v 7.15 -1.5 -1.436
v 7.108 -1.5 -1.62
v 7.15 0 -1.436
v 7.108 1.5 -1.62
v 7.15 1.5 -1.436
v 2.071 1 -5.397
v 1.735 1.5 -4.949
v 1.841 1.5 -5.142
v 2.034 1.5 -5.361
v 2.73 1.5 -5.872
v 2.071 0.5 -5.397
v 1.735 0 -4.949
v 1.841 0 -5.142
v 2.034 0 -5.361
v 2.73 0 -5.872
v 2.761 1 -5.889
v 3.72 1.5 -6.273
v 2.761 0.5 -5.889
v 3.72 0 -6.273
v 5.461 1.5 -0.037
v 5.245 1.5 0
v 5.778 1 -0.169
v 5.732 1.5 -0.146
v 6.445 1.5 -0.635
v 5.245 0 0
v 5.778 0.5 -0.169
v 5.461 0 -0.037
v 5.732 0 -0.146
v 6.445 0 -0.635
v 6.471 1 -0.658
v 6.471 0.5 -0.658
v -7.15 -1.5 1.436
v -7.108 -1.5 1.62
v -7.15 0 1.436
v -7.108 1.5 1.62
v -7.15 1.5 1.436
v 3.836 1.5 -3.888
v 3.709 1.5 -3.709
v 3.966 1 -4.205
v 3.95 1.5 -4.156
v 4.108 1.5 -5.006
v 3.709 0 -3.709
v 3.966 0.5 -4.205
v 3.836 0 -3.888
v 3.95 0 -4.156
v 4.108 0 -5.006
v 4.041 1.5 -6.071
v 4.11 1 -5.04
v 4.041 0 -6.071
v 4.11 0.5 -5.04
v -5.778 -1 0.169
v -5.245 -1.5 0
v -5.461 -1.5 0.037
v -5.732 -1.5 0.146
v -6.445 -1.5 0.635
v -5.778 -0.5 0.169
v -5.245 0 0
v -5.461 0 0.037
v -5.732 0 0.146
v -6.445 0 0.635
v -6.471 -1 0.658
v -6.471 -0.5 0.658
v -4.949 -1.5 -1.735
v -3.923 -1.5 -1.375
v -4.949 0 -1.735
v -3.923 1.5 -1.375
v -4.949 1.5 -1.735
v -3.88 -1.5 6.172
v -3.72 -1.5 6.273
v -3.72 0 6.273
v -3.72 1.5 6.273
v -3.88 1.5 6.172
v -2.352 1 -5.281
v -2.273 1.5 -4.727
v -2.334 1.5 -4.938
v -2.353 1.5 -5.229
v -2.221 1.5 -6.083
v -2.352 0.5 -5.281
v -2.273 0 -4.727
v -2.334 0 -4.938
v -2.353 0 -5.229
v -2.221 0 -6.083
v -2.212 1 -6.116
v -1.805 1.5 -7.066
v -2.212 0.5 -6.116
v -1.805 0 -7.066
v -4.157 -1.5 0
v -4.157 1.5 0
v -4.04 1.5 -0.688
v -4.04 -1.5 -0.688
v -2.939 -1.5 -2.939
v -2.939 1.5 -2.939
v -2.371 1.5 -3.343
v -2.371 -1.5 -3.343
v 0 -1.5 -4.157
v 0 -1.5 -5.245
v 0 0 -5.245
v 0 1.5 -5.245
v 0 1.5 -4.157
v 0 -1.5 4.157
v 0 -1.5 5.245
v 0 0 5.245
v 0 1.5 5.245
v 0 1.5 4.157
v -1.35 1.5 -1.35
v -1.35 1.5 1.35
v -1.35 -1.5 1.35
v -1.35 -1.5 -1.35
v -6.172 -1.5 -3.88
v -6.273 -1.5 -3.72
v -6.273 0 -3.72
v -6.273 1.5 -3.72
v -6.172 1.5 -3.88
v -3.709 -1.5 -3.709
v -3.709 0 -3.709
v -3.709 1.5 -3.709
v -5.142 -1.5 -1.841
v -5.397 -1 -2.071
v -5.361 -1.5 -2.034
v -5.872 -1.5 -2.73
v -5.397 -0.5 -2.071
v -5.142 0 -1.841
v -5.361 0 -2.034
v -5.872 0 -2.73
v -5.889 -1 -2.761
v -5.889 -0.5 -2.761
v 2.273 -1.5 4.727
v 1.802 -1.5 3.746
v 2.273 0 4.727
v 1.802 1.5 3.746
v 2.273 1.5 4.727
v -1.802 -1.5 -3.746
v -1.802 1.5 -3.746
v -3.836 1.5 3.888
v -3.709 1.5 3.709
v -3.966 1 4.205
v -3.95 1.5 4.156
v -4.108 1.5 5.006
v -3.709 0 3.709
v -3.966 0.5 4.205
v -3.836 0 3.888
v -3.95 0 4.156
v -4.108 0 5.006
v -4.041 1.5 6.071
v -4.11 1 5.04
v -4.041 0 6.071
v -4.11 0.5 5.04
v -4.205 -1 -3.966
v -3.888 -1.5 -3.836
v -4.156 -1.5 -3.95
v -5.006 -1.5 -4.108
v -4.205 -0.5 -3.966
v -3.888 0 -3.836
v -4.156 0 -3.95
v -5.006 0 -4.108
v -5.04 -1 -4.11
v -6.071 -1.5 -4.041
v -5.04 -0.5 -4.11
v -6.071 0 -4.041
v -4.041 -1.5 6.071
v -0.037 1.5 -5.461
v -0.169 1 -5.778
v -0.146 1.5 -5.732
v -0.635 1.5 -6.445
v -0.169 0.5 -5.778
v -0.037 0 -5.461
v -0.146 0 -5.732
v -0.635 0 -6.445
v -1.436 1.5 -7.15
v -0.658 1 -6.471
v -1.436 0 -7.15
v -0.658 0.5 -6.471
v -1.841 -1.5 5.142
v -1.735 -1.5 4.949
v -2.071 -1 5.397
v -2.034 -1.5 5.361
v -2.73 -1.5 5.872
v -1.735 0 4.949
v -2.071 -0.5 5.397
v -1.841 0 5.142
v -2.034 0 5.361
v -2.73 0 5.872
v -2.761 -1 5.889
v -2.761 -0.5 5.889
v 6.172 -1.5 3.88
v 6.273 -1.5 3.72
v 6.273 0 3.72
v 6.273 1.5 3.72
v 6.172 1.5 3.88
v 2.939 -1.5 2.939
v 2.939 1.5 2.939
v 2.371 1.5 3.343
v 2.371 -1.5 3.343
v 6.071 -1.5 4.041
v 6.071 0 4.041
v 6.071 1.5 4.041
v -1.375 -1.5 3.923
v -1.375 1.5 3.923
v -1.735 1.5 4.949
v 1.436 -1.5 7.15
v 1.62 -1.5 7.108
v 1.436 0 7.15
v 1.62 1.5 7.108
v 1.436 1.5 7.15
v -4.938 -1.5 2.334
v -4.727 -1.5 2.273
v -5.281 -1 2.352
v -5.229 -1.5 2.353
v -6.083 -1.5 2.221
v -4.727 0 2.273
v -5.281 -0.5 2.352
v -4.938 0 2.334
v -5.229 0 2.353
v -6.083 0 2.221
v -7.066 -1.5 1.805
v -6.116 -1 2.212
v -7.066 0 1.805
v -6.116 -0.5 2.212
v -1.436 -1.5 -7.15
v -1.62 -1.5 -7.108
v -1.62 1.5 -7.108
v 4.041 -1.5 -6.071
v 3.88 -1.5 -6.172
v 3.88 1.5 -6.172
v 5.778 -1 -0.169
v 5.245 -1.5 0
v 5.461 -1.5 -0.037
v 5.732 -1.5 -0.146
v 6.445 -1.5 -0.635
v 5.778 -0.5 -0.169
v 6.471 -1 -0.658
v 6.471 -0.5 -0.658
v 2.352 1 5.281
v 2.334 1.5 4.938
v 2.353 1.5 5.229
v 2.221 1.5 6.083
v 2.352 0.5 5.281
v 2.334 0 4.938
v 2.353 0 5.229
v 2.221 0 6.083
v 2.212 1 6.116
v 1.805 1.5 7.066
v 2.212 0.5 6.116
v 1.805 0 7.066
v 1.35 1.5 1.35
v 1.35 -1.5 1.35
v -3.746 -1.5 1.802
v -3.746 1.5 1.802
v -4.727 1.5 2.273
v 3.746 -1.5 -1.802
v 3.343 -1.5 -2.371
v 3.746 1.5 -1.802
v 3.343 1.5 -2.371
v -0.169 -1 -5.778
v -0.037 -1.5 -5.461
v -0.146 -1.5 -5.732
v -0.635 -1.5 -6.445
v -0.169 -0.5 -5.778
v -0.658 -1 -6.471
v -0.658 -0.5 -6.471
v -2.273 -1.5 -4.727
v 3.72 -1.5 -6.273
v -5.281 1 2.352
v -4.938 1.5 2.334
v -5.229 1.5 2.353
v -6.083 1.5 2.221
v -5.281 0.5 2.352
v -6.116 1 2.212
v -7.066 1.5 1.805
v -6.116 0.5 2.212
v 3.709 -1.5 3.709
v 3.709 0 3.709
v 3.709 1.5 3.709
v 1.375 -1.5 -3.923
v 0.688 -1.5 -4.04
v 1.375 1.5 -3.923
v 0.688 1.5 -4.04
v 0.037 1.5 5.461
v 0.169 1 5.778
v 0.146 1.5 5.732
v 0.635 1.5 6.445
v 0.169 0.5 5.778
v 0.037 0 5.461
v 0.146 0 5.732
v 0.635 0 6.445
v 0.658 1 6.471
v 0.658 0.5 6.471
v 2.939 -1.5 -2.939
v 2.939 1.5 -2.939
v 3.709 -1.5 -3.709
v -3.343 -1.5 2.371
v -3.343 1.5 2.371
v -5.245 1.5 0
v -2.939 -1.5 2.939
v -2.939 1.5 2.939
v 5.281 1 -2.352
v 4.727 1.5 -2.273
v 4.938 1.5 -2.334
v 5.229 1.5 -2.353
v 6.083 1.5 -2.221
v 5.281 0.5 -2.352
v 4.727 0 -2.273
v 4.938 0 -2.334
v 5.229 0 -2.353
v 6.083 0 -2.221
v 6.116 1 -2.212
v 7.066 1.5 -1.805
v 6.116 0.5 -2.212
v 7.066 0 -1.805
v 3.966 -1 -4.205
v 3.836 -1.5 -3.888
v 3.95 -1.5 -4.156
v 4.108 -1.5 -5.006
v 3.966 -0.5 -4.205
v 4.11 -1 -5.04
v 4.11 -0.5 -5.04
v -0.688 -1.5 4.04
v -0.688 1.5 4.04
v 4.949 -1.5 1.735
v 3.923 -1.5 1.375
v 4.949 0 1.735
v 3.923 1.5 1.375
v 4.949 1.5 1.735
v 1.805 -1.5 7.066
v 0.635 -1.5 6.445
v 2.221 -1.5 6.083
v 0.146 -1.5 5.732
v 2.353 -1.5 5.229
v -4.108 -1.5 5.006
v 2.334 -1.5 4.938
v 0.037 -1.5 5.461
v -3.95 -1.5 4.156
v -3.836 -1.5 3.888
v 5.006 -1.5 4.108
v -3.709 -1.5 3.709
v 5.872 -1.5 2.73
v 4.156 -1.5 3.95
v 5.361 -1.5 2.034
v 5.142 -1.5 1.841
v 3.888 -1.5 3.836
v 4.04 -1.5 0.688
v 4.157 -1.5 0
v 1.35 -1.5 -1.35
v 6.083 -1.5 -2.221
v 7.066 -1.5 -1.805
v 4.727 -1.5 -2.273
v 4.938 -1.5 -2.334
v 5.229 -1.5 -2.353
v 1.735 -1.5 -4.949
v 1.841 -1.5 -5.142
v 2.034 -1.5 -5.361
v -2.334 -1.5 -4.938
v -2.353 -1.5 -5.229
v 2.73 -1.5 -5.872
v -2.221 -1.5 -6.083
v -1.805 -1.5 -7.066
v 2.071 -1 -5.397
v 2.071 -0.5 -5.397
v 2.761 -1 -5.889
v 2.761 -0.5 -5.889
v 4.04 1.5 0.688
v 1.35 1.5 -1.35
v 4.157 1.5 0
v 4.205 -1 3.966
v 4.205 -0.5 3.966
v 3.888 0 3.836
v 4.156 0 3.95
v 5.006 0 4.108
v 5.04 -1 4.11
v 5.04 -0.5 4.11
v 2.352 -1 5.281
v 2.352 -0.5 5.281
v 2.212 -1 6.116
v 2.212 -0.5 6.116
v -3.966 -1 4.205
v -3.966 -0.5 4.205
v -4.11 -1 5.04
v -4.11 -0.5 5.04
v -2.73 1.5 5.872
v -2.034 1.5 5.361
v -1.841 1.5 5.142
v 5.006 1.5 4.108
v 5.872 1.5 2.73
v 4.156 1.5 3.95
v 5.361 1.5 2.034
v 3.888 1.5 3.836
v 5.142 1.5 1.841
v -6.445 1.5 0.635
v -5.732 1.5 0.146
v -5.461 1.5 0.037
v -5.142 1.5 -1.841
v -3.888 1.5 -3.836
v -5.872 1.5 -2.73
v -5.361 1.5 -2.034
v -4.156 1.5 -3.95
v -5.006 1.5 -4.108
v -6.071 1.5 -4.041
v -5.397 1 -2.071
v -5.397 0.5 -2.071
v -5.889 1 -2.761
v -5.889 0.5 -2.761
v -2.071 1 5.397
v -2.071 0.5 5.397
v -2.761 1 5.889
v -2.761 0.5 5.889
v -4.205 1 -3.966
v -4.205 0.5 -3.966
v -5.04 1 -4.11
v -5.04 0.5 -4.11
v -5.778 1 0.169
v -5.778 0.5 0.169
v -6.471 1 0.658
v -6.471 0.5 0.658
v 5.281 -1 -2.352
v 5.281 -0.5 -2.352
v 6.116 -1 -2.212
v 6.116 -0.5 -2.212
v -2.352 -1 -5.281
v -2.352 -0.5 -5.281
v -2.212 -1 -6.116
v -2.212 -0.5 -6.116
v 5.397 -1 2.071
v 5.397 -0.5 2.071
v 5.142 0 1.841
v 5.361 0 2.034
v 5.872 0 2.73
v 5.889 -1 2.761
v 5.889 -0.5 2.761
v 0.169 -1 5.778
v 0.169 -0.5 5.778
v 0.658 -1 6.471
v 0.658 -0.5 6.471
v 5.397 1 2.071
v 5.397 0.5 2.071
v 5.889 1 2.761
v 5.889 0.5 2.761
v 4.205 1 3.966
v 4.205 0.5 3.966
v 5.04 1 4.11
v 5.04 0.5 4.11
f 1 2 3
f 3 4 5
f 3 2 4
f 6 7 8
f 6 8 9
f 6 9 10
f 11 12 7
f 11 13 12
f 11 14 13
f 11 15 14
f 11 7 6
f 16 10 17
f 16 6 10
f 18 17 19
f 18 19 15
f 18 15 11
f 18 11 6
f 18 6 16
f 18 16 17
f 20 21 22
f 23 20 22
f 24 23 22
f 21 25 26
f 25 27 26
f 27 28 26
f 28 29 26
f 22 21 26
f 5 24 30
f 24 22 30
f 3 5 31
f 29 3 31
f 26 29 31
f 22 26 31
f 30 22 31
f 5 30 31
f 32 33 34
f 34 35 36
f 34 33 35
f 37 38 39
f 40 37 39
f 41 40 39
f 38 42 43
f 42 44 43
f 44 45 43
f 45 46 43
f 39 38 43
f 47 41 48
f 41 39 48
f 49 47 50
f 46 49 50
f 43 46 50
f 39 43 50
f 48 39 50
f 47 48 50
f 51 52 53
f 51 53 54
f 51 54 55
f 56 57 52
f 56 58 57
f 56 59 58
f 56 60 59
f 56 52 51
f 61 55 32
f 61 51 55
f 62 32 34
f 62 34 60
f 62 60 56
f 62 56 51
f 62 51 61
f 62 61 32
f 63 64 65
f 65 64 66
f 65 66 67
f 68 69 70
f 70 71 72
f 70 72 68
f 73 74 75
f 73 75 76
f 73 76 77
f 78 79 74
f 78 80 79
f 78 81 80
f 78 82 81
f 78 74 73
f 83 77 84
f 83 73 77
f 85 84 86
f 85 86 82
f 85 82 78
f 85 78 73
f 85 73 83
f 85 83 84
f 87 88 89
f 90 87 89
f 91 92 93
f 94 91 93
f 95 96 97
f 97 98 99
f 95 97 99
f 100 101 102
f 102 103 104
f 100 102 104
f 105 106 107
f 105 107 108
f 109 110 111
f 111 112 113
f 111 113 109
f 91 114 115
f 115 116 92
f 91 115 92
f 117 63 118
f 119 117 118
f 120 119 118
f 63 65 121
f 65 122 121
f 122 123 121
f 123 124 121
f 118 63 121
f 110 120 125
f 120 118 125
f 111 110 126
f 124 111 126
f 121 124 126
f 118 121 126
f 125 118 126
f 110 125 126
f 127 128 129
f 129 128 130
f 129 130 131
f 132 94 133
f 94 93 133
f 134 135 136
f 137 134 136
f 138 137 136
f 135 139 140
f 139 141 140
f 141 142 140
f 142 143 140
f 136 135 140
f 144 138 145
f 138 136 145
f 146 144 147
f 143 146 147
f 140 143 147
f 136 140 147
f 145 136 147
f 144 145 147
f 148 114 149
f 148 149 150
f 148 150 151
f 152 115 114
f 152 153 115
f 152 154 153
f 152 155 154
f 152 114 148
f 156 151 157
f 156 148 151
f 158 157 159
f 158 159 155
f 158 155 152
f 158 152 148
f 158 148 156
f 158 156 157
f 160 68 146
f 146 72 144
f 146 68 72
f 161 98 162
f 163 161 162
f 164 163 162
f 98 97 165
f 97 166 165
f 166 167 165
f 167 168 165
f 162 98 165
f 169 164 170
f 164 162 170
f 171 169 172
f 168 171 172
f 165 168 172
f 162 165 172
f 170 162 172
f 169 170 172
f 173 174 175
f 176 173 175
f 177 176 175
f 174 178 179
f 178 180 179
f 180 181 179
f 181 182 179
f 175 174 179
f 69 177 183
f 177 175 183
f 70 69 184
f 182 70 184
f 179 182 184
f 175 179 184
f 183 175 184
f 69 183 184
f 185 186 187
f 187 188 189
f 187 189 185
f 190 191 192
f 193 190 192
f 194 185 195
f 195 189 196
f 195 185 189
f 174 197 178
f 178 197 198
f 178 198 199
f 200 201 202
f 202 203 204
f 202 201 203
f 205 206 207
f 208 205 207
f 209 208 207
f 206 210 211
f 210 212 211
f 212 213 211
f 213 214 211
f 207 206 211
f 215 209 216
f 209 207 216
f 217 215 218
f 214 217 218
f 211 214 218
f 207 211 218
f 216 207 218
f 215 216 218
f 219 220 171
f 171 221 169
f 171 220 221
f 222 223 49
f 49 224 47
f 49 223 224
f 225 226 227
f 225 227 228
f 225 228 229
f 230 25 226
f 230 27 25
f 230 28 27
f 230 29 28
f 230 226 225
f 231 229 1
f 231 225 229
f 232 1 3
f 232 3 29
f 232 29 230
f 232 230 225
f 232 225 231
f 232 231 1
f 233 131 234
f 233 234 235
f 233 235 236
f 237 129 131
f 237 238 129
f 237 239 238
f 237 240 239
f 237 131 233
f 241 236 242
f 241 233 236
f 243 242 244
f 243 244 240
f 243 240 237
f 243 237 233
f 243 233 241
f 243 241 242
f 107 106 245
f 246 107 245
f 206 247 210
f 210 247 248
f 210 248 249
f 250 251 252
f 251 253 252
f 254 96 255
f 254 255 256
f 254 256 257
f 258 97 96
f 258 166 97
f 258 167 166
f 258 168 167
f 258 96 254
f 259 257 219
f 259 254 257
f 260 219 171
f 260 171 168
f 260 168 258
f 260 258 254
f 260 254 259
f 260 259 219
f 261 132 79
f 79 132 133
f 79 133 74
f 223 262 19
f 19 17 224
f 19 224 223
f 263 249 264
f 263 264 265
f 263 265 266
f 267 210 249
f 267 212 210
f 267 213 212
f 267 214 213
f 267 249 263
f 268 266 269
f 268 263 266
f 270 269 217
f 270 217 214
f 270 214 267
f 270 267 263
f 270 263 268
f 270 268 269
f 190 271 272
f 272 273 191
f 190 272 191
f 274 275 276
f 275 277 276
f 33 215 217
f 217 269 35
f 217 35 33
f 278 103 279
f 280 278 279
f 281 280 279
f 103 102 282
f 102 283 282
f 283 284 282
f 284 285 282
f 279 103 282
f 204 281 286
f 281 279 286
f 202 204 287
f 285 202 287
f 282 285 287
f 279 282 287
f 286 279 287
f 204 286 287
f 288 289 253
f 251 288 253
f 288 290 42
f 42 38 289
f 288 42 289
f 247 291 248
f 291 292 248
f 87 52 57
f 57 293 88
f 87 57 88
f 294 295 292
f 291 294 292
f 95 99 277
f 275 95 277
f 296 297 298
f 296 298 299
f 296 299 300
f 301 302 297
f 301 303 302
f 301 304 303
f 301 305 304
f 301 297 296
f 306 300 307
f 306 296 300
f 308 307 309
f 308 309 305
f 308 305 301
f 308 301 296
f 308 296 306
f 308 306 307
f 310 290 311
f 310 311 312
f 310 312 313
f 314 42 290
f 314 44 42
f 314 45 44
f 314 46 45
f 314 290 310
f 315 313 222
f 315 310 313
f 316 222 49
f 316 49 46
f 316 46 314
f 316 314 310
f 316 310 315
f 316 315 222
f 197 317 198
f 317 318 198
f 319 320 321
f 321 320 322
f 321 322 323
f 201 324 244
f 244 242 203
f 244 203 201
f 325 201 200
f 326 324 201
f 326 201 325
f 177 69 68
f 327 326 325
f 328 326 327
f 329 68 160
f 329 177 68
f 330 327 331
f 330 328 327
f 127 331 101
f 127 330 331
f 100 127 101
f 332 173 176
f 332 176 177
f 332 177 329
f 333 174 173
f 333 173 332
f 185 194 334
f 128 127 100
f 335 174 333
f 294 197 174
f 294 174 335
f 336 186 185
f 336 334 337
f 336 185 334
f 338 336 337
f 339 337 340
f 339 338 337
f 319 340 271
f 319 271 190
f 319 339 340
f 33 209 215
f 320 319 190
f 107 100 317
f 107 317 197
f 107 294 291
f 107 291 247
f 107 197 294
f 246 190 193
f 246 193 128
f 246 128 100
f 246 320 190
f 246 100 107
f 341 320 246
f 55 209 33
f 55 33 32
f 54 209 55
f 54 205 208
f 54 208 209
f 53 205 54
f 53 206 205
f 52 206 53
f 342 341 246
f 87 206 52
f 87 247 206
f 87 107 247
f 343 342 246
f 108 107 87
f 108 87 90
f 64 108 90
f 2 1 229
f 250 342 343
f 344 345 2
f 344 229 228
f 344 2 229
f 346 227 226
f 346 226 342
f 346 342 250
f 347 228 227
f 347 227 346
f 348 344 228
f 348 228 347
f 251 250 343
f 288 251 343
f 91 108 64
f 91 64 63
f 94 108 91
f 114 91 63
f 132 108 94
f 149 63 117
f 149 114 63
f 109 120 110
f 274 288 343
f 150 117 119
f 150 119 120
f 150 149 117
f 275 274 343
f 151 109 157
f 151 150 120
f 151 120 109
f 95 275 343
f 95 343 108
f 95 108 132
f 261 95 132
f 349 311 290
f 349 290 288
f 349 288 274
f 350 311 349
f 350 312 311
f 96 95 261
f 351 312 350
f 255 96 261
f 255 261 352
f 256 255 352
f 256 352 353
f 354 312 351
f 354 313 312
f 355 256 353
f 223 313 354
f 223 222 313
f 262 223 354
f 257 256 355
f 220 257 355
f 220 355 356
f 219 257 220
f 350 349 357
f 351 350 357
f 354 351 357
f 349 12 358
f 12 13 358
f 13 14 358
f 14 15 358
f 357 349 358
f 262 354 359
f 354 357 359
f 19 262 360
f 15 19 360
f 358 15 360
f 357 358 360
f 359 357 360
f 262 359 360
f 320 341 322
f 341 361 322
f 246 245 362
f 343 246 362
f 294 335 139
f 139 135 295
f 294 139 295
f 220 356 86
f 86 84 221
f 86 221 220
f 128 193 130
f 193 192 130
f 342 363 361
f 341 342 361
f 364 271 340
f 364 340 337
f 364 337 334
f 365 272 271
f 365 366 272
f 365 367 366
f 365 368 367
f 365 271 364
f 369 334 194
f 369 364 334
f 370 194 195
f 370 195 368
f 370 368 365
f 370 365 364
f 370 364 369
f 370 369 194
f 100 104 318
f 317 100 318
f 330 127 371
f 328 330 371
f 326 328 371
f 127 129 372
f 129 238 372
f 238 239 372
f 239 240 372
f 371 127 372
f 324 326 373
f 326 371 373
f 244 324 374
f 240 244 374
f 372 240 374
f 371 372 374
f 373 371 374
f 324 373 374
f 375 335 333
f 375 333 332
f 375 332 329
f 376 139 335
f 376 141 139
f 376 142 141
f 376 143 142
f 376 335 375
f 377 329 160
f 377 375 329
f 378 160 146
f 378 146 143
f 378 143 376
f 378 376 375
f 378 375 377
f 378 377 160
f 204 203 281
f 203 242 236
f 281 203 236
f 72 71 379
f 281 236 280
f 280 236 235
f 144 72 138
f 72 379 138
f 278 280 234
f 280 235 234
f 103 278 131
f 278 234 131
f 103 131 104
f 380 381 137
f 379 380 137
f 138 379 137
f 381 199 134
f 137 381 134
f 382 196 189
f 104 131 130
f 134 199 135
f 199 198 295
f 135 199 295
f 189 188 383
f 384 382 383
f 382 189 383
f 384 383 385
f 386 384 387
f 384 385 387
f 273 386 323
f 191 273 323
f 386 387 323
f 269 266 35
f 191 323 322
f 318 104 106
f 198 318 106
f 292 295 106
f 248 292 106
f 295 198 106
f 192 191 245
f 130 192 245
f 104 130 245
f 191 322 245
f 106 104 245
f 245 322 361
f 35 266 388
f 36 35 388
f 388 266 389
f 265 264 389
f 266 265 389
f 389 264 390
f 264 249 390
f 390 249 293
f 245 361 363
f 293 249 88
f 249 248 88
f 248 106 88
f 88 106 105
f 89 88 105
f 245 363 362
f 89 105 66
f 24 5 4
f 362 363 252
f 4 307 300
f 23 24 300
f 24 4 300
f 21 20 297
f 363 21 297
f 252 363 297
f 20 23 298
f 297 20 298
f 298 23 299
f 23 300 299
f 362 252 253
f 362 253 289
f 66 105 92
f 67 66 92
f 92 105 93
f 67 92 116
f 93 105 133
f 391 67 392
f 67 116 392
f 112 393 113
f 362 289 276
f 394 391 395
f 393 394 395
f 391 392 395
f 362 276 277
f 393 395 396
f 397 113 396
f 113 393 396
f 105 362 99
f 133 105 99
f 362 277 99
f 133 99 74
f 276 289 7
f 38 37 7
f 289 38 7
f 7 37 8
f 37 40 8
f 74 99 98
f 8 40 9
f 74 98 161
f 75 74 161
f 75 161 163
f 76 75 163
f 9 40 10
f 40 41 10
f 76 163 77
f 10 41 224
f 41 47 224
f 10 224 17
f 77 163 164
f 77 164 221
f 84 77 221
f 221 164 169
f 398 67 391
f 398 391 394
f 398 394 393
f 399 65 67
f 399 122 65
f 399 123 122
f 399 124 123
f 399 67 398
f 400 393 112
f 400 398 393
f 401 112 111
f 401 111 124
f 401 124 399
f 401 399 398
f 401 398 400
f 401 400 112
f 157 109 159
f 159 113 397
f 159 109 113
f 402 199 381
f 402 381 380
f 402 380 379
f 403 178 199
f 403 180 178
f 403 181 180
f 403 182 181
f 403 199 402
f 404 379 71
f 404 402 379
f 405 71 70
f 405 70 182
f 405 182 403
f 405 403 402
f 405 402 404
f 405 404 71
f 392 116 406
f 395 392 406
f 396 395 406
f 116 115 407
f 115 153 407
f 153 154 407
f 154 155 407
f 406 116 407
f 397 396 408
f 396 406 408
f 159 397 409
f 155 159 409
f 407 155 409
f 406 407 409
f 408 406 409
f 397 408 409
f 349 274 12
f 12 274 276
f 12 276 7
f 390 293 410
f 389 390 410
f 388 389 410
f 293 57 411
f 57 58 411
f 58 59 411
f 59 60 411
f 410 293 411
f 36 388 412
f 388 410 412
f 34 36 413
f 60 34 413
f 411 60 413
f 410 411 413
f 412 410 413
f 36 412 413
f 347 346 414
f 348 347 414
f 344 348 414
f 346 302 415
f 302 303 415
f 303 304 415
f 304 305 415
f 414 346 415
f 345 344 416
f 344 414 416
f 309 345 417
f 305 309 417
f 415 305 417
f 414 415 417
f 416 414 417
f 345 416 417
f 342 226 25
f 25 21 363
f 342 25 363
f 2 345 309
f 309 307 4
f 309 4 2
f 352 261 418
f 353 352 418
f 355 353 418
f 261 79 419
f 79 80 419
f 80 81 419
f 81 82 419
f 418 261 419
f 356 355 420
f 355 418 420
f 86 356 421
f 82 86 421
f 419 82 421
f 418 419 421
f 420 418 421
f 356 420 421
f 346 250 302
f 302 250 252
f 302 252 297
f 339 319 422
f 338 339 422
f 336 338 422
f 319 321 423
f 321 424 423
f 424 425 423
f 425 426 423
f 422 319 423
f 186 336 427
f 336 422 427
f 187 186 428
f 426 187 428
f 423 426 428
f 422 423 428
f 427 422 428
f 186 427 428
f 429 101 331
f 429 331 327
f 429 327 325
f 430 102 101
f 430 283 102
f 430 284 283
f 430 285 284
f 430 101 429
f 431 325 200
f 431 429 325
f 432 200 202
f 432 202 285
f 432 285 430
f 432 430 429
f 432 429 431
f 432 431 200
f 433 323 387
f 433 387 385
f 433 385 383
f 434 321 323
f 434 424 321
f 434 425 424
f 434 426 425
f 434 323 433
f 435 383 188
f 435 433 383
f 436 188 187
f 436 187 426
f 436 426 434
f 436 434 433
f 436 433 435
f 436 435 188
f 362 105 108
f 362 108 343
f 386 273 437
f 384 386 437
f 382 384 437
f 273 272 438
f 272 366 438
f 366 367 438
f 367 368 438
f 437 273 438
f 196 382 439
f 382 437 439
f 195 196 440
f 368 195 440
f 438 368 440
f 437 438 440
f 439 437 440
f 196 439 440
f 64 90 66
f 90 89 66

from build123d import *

# Parameters (mm, degrees)
BOSS_EXTRUDE1_DEPTH = 1.5
CIRPATTERN1_COUNT   = 8
SKETCH4_W           = 2.7
SKETCH4_H           = 2.7
CUT_EXTRUDE1_DEPTH  = 11.547606867


with BuildPart() as part:
    # Sketch5 → Boss-Extrude1 (new, symmetric)
    with BuildSketch(Plane(origin=(0, 0, 0), x_dir=(1, 0, 0), z_dir=(0, 1, 0))):
        with BuildLine():
            Line((0, 0), (3.342855658, 2.370565581))
            Line((3.342855658, 2.370565581), (3.746267067, 1.80169155))
            Line((3.746267067, 1.80169155), (4.726512919, 2.273109454))
            add(Edge.make_bspline(
                [(4.726512919, 2.273109454), (5.083840243, 2.444954607), (6.11501814, 2.361263688), (7.066052624, 1.805087159)],
                knots=[0, 0, 0, 0, 1, 1, 1, 1], degree=3))
            Line((7.066052624, 1.805087159), (7.108150593, 1.620429032))
            Line((7.108150593, 1.620429032), (7.150245001, 1.435770094))
            add(Edge.make_bspline(
                [(5.244706948, 7.012e-06), (5.641208616, 1.0552e-05), (6.534229602, 0.522356744), (7.150245001, 1.435770094)],
                knots=[0, 0, 0, 0, 1, 1, 1, 1], degree=3))
            Line((5.244706948, 7.012e-06), (4.156995234, -2.698e-06))
            Line((4.156995234, -2.698e-06), (4.039998902, -0.687512906))
            Line((4.039998902, -0.687512906), (0, 0))
        make_face()
    boss_extrude1 = extrude(amount=BOSS_EXTRUDE1_DEPTH, both=True)

    # CirPattern1: Boss-Extrude1 ×8 about axis
    cirpattern1_axis = Axis((0, -1.5, 0), (0, 1, 0))
    for i in range(1, CIRPATTERN1_COUNT):
        add(boss_extrude1.rotate(cirpattern1_axis, i * 360 / CIRPATTERN1_COUNT))

    # Sketch4 → Cut-Extrude1 (cut, through all)
    with BuildSketch(Plane(origin=(0, 1.5, 0), x_dir=(1, 0, 0), z_dir=(0, 1, 0))):
        Rectangle(SKETCH4_W, SKETCH4_H)
    extrude(amount=-CUT_EXTRUDE1_DEPTH, mode=Mode.SUBTRACT)


solid = part.part
